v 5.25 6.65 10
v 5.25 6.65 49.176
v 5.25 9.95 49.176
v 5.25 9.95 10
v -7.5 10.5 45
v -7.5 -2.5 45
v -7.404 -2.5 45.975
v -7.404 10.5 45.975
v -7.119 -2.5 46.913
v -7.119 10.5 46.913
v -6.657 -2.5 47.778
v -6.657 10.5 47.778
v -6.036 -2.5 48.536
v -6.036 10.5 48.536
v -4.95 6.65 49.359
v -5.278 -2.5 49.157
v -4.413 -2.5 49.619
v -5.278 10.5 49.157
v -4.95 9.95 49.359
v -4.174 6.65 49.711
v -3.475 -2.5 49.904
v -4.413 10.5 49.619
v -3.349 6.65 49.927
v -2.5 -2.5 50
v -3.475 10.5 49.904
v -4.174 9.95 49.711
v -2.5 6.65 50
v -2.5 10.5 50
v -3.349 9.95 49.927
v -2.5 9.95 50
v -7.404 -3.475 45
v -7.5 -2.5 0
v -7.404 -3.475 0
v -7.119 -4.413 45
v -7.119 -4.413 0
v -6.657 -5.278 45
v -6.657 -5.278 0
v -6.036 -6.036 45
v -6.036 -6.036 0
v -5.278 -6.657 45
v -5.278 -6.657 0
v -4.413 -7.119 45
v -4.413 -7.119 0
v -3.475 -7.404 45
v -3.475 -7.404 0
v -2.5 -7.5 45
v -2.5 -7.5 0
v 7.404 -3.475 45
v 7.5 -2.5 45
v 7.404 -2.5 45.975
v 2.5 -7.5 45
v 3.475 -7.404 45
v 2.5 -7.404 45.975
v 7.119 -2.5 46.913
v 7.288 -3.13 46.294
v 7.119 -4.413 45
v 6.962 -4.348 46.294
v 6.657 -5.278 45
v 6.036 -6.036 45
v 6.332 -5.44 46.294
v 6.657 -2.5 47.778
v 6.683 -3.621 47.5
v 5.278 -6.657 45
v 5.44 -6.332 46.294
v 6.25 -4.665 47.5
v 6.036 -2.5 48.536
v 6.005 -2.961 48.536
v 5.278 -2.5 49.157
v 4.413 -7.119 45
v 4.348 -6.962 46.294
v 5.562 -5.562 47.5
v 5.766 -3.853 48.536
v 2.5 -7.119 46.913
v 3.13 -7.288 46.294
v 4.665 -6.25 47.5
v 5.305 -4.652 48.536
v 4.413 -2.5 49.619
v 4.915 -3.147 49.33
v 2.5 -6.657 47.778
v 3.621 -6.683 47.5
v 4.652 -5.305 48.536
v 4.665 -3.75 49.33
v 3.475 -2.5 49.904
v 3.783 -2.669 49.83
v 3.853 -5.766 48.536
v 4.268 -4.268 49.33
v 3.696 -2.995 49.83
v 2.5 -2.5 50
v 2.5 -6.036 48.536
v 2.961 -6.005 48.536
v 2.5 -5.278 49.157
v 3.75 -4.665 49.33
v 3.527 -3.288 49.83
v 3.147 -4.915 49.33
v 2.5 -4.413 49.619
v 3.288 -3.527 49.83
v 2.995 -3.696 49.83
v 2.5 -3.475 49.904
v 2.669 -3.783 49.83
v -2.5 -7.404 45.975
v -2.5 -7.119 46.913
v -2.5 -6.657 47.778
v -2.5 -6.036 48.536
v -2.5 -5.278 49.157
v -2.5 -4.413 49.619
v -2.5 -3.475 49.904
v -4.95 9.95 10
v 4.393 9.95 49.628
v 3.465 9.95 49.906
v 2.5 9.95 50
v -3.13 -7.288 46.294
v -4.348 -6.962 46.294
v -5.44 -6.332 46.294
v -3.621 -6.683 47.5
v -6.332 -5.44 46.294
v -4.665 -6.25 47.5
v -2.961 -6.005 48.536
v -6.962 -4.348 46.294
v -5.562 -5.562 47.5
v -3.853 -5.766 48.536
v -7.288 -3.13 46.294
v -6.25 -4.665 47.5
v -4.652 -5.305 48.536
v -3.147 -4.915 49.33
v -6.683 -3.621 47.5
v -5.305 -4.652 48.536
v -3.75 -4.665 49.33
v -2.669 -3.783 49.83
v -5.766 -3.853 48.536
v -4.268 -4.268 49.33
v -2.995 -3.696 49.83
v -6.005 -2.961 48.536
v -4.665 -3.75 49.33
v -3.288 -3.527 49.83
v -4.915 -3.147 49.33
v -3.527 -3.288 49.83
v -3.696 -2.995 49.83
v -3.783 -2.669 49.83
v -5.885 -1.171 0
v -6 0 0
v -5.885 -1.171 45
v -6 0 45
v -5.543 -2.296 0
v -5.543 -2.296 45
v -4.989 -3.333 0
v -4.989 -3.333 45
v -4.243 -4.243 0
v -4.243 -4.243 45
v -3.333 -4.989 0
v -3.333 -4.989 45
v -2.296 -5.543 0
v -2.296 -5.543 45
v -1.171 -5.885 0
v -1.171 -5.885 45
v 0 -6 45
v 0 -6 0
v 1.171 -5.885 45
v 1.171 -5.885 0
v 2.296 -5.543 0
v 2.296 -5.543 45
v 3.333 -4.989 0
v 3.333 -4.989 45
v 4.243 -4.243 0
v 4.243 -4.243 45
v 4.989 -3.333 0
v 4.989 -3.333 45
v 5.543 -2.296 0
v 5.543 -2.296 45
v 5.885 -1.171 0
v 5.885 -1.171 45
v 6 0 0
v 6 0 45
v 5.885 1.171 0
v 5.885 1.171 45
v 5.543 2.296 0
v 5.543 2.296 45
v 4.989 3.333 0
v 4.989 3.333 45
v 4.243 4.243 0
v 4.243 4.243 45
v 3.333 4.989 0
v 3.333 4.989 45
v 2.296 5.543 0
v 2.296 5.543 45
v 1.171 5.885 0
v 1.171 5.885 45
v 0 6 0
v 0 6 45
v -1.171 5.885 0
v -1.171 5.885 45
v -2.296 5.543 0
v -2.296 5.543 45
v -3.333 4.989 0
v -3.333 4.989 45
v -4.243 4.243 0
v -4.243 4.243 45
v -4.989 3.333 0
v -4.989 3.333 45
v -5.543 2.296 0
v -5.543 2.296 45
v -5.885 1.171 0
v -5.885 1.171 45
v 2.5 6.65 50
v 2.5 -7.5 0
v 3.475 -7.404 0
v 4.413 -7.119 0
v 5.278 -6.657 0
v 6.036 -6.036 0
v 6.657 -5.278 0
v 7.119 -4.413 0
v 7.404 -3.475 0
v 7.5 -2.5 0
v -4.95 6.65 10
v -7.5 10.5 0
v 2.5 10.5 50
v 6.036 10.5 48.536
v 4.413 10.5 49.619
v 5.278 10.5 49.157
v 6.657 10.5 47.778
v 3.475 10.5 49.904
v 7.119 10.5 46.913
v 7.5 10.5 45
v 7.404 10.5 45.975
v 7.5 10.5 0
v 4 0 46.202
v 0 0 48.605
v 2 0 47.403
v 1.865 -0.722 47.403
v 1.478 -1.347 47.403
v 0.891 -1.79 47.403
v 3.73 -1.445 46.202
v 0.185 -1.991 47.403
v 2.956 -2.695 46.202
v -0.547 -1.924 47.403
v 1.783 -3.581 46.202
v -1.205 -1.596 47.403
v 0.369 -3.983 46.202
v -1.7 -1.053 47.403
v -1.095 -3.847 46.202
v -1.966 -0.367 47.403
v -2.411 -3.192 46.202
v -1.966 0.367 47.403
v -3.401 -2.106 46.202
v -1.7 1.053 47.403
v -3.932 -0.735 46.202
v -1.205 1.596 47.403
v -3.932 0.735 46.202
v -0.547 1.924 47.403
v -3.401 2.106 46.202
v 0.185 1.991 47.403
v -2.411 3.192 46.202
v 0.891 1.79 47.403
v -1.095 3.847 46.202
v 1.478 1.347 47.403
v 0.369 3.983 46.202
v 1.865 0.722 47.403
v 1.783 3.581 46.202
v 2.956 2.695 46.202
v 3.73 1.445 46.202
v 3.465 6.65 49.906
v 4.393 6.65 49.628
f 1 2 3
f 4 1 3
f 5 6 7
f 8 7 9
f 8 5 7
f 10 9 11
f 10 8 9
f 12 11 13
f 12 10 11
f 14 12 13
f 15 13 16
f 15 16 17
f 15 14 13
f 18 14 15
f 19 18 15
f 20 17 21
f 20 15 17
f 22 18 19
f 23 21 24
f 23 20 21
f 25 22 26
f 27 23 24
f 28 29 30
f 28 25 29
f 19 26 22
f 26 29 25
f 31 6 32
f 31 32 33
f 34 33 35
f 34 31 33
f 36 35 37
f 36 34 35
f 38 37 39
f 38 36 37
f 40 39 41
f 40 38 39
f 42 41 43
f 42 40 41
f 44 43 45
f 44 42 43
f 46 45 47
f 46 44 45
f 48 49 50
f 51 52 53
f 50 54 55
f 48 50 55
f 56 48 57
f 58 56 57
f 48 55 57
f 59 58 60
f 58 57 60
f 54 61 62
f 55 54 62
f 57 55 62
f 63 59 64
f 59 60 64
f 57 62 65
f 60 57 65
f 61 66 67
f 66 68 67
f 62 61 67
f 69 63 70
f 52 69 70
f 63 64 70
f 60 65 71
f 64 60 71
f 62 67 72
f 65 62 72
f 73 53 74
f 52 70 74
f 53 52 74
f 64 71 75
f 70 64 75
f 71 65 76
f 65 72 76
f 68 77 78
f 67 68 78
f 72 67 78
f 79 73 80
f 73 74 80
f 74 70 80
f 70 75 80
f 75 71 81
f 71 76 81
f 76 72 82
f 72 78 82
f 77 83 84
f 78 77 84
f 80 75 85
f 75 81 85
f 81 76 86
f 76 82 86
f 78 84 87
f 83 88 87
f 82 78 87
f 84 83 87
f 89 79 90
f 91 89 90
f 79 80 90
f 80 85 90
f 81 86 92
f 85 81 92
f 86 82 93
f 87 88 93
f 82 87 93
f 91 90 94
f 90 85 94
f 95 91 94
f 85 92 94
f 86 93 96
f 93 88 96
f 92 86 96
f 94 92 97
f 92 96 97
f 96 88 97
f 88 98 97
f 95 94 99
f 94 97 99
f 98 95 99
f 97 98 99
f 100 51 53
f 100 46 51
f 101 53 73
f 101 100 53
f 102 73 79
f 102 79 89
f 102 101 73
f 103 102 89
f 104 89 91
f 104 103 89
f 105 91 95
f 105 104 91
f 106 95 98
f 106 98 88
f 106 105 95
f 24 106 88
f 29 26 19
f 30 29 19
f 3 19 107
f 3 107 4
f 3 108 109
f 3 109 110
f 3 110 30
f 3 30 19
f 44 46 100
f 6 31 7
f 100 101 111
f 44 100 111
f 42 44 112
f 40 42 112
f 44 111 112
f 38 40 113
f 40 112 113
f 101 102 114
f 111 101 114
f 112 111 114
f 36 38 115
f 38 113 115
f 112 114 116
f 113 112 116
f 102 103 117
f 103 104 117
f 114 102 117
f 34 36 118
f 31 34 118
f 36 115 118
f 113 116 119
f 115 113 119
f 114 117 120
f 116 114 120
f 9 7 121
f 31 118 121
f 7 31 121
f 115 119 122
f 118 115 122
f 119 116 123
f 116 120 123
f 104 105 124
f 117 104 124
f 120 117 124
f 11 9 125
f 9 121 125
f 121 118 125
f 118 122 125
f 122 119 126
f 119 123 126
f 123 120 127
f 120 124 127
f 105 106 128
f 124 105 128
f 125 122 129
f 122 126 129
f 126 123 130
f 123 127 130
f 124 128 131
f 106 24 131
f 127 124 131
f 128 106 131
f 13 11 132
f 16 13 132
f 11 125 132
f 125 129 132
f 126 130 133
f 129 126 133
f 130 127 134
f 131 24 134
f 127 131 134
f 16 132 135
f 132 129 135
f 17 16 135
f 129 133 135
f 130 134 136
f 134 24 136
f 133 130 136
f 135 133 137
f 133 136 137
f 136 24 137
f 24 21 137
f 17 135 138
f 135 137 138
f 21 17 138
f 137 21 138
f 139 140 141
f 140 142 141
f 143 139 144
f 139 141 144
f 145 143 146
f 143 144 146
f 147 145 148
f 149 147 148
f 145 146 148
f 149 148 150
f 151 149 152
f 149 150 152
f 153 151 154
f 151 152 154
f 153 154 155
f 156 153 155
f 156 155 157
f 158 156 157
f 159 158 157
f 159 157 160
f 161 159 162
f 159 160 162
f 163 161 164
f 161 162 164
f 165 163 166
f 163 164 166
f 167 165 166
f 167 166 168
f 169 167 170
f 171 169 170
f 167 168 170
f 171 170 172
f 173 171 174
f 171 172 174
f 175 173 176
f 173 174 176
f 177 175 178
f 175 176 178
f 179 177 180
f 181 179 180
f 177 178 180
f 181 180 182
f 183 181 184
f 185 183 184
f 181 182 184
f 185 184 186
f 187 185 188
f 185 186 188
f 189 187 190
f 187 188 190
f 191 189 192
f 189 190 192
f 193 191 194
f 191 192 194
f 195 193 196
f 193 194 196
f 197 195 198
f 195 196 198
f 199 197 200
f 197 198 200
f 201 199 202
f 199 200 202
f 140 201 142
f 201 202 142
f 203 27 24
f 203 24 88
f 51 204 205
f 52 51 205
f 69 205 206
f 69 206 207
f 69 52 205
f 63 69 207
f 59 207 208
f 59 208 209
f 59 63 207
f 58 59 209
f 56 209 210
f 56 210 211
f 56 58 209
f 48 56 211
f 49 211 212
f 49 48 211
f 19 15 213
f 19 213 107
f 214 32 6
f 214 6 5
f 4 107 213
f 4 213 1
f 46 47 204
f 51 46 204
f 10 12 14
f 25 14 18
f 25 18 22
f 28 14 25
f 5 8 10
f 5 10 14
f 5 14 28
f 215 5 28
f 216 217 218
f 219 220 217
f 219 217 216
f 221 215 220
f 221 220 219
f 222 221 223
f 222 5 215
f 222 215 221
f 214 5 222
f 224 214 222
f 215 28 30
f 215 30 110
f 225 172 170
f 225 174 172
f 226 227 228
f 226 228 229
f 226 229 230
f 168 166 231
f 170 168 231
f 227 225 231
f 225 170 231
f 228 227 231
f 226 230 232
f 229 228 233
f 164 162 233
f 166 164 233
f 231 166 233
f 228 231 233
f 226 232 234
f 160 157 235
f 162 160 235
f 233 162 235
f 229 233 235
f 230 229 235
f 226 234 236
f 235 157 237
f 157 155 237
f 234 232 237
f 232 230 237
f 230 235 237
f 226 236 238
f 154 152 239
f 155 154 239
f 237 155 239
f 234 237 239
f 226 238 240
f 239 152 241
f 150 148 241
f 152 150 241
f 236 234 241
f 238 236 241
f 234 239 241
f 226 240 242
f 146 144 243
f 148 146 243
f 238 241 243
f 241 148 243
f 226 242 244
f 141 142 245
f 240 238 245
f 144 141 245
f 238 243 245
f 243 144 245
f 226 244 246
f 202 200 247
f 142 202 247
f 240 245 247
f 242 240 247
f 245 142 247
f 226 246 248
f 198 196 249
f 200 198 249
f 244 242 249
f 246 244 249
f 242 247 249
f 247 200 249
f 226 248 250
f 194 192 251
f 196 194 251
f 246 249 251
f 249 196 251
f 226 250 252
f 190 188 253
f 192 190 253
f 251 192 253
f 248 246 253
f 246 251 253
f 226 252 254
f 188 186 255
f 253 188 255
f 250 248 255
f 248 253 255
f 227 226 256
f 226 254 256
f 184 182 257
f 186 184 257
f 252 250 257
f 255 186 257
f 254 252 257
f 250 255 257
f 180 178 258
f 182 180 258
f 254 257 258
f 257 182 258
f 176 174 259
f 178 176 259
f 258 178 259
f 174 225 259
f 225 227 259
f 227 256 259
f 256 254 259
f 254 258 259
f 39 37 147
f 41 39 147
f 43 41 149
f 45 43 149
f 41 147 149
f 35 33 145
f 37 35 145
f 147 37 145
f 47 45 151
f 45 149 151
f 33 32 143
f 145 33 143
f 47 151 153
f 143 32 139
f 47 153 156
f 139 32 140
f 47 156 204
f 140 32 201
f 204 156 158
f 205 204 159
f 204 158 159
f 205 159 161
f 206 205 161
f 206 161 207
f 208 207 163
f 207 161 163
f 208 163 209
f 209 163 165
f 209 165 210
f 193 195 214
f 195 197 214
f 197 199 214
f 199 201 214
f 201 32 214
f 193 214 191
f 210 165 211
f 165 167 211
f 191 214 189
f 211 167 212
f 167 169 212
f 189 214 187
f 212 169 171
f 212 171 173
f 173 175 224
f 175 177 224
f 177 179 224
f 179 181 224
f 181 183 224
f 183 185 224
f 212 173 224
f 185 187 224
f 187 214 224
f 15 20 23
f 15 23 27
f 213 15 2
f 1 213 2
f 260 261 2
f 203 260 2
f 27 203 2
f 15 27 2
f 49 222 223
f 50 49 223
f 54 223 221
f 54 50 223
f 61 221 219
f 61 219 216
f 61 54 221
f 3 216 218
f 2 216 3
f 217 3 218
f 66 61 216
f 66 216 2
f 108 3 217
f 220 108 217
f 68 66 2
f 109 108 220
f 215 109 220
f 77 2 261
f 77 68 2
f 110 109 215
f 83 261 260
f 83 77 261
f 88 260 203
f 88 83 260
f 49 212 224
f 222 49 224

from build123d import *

# Parameters (mm, degrees)
F0_W     = 15
F0_H     = 18
F0_R     = 6
F0_W_2   = 10.2
F0_H_2   = 3.3
F1_DEPTH = 50
F2_D     = 12
F2_DEPTH = 45
F2_TIP   = 3.6051637142
F3_R     = 5
F4_R     = 5
F6_W     = 10.2
F6_H     = 3.3
F7_DEPTH = 40


with BuildPart() as f1:
    # F0 (on Top) → F1 (new body)
    with BuildSketch(Plane.XY):
        with Locations((0, 1.5)):
            Rectangle(F0_W, F0_H)
        Circle(F0_R, mode=Mode.SUBTRACT)
        with Locations((-0.15, 8.3)):
            Rectangle(F0_W_2, F0_H_2, mode=Mode.SUBTRACT)
        with Locations((-0.15, 8.3)):
            Rectangle(F0_W_2, F0_H_2)
        Circle(F0_R)
    extrude(amount=F1_DEPTH)

    # F2
    with Locations(Plane(origin=(0, 0, 0), x_dir=(1, 0, 0), z_dir=(0, 0, -1))):
        with Locations((0, 0)):
            Hole(F2_D / 2, depth=F2_DEPTH)
            with Locations((0, 0, -(F2_DEPTH + F2_TIP / 2))):  # 118° drill point
                Cone(0, F2_D / 2, F2_TIP, mode=Mode.SUBTRACT)

    # F3
    f3_edges = [f1.edges().sort_by_distance(p)[0] for p in [
        (7.5, -7.5, 25),
        (-7.5, -7.5, 25),
    ]]
    fillet(f3_edges, radius=F3_R)

    # F4
    f4_edges = [f1.edges().sort_by_distance(p)[0] for p in [
        (-7.5, 4, 50),
    ]]
    fillet(f4_edges, radius=F4_R)

    # F6 (on offset) → F7 (cut)
    with BuildSketch(Plane.XY.offset(50)):
        with Locations((0.15, 8.3)):
            Rectangle(F6_W, F6_H)
    extrude(amount=-F7_DEPTH, mode=Mode.SUBTRACT)


solid = f1.part
